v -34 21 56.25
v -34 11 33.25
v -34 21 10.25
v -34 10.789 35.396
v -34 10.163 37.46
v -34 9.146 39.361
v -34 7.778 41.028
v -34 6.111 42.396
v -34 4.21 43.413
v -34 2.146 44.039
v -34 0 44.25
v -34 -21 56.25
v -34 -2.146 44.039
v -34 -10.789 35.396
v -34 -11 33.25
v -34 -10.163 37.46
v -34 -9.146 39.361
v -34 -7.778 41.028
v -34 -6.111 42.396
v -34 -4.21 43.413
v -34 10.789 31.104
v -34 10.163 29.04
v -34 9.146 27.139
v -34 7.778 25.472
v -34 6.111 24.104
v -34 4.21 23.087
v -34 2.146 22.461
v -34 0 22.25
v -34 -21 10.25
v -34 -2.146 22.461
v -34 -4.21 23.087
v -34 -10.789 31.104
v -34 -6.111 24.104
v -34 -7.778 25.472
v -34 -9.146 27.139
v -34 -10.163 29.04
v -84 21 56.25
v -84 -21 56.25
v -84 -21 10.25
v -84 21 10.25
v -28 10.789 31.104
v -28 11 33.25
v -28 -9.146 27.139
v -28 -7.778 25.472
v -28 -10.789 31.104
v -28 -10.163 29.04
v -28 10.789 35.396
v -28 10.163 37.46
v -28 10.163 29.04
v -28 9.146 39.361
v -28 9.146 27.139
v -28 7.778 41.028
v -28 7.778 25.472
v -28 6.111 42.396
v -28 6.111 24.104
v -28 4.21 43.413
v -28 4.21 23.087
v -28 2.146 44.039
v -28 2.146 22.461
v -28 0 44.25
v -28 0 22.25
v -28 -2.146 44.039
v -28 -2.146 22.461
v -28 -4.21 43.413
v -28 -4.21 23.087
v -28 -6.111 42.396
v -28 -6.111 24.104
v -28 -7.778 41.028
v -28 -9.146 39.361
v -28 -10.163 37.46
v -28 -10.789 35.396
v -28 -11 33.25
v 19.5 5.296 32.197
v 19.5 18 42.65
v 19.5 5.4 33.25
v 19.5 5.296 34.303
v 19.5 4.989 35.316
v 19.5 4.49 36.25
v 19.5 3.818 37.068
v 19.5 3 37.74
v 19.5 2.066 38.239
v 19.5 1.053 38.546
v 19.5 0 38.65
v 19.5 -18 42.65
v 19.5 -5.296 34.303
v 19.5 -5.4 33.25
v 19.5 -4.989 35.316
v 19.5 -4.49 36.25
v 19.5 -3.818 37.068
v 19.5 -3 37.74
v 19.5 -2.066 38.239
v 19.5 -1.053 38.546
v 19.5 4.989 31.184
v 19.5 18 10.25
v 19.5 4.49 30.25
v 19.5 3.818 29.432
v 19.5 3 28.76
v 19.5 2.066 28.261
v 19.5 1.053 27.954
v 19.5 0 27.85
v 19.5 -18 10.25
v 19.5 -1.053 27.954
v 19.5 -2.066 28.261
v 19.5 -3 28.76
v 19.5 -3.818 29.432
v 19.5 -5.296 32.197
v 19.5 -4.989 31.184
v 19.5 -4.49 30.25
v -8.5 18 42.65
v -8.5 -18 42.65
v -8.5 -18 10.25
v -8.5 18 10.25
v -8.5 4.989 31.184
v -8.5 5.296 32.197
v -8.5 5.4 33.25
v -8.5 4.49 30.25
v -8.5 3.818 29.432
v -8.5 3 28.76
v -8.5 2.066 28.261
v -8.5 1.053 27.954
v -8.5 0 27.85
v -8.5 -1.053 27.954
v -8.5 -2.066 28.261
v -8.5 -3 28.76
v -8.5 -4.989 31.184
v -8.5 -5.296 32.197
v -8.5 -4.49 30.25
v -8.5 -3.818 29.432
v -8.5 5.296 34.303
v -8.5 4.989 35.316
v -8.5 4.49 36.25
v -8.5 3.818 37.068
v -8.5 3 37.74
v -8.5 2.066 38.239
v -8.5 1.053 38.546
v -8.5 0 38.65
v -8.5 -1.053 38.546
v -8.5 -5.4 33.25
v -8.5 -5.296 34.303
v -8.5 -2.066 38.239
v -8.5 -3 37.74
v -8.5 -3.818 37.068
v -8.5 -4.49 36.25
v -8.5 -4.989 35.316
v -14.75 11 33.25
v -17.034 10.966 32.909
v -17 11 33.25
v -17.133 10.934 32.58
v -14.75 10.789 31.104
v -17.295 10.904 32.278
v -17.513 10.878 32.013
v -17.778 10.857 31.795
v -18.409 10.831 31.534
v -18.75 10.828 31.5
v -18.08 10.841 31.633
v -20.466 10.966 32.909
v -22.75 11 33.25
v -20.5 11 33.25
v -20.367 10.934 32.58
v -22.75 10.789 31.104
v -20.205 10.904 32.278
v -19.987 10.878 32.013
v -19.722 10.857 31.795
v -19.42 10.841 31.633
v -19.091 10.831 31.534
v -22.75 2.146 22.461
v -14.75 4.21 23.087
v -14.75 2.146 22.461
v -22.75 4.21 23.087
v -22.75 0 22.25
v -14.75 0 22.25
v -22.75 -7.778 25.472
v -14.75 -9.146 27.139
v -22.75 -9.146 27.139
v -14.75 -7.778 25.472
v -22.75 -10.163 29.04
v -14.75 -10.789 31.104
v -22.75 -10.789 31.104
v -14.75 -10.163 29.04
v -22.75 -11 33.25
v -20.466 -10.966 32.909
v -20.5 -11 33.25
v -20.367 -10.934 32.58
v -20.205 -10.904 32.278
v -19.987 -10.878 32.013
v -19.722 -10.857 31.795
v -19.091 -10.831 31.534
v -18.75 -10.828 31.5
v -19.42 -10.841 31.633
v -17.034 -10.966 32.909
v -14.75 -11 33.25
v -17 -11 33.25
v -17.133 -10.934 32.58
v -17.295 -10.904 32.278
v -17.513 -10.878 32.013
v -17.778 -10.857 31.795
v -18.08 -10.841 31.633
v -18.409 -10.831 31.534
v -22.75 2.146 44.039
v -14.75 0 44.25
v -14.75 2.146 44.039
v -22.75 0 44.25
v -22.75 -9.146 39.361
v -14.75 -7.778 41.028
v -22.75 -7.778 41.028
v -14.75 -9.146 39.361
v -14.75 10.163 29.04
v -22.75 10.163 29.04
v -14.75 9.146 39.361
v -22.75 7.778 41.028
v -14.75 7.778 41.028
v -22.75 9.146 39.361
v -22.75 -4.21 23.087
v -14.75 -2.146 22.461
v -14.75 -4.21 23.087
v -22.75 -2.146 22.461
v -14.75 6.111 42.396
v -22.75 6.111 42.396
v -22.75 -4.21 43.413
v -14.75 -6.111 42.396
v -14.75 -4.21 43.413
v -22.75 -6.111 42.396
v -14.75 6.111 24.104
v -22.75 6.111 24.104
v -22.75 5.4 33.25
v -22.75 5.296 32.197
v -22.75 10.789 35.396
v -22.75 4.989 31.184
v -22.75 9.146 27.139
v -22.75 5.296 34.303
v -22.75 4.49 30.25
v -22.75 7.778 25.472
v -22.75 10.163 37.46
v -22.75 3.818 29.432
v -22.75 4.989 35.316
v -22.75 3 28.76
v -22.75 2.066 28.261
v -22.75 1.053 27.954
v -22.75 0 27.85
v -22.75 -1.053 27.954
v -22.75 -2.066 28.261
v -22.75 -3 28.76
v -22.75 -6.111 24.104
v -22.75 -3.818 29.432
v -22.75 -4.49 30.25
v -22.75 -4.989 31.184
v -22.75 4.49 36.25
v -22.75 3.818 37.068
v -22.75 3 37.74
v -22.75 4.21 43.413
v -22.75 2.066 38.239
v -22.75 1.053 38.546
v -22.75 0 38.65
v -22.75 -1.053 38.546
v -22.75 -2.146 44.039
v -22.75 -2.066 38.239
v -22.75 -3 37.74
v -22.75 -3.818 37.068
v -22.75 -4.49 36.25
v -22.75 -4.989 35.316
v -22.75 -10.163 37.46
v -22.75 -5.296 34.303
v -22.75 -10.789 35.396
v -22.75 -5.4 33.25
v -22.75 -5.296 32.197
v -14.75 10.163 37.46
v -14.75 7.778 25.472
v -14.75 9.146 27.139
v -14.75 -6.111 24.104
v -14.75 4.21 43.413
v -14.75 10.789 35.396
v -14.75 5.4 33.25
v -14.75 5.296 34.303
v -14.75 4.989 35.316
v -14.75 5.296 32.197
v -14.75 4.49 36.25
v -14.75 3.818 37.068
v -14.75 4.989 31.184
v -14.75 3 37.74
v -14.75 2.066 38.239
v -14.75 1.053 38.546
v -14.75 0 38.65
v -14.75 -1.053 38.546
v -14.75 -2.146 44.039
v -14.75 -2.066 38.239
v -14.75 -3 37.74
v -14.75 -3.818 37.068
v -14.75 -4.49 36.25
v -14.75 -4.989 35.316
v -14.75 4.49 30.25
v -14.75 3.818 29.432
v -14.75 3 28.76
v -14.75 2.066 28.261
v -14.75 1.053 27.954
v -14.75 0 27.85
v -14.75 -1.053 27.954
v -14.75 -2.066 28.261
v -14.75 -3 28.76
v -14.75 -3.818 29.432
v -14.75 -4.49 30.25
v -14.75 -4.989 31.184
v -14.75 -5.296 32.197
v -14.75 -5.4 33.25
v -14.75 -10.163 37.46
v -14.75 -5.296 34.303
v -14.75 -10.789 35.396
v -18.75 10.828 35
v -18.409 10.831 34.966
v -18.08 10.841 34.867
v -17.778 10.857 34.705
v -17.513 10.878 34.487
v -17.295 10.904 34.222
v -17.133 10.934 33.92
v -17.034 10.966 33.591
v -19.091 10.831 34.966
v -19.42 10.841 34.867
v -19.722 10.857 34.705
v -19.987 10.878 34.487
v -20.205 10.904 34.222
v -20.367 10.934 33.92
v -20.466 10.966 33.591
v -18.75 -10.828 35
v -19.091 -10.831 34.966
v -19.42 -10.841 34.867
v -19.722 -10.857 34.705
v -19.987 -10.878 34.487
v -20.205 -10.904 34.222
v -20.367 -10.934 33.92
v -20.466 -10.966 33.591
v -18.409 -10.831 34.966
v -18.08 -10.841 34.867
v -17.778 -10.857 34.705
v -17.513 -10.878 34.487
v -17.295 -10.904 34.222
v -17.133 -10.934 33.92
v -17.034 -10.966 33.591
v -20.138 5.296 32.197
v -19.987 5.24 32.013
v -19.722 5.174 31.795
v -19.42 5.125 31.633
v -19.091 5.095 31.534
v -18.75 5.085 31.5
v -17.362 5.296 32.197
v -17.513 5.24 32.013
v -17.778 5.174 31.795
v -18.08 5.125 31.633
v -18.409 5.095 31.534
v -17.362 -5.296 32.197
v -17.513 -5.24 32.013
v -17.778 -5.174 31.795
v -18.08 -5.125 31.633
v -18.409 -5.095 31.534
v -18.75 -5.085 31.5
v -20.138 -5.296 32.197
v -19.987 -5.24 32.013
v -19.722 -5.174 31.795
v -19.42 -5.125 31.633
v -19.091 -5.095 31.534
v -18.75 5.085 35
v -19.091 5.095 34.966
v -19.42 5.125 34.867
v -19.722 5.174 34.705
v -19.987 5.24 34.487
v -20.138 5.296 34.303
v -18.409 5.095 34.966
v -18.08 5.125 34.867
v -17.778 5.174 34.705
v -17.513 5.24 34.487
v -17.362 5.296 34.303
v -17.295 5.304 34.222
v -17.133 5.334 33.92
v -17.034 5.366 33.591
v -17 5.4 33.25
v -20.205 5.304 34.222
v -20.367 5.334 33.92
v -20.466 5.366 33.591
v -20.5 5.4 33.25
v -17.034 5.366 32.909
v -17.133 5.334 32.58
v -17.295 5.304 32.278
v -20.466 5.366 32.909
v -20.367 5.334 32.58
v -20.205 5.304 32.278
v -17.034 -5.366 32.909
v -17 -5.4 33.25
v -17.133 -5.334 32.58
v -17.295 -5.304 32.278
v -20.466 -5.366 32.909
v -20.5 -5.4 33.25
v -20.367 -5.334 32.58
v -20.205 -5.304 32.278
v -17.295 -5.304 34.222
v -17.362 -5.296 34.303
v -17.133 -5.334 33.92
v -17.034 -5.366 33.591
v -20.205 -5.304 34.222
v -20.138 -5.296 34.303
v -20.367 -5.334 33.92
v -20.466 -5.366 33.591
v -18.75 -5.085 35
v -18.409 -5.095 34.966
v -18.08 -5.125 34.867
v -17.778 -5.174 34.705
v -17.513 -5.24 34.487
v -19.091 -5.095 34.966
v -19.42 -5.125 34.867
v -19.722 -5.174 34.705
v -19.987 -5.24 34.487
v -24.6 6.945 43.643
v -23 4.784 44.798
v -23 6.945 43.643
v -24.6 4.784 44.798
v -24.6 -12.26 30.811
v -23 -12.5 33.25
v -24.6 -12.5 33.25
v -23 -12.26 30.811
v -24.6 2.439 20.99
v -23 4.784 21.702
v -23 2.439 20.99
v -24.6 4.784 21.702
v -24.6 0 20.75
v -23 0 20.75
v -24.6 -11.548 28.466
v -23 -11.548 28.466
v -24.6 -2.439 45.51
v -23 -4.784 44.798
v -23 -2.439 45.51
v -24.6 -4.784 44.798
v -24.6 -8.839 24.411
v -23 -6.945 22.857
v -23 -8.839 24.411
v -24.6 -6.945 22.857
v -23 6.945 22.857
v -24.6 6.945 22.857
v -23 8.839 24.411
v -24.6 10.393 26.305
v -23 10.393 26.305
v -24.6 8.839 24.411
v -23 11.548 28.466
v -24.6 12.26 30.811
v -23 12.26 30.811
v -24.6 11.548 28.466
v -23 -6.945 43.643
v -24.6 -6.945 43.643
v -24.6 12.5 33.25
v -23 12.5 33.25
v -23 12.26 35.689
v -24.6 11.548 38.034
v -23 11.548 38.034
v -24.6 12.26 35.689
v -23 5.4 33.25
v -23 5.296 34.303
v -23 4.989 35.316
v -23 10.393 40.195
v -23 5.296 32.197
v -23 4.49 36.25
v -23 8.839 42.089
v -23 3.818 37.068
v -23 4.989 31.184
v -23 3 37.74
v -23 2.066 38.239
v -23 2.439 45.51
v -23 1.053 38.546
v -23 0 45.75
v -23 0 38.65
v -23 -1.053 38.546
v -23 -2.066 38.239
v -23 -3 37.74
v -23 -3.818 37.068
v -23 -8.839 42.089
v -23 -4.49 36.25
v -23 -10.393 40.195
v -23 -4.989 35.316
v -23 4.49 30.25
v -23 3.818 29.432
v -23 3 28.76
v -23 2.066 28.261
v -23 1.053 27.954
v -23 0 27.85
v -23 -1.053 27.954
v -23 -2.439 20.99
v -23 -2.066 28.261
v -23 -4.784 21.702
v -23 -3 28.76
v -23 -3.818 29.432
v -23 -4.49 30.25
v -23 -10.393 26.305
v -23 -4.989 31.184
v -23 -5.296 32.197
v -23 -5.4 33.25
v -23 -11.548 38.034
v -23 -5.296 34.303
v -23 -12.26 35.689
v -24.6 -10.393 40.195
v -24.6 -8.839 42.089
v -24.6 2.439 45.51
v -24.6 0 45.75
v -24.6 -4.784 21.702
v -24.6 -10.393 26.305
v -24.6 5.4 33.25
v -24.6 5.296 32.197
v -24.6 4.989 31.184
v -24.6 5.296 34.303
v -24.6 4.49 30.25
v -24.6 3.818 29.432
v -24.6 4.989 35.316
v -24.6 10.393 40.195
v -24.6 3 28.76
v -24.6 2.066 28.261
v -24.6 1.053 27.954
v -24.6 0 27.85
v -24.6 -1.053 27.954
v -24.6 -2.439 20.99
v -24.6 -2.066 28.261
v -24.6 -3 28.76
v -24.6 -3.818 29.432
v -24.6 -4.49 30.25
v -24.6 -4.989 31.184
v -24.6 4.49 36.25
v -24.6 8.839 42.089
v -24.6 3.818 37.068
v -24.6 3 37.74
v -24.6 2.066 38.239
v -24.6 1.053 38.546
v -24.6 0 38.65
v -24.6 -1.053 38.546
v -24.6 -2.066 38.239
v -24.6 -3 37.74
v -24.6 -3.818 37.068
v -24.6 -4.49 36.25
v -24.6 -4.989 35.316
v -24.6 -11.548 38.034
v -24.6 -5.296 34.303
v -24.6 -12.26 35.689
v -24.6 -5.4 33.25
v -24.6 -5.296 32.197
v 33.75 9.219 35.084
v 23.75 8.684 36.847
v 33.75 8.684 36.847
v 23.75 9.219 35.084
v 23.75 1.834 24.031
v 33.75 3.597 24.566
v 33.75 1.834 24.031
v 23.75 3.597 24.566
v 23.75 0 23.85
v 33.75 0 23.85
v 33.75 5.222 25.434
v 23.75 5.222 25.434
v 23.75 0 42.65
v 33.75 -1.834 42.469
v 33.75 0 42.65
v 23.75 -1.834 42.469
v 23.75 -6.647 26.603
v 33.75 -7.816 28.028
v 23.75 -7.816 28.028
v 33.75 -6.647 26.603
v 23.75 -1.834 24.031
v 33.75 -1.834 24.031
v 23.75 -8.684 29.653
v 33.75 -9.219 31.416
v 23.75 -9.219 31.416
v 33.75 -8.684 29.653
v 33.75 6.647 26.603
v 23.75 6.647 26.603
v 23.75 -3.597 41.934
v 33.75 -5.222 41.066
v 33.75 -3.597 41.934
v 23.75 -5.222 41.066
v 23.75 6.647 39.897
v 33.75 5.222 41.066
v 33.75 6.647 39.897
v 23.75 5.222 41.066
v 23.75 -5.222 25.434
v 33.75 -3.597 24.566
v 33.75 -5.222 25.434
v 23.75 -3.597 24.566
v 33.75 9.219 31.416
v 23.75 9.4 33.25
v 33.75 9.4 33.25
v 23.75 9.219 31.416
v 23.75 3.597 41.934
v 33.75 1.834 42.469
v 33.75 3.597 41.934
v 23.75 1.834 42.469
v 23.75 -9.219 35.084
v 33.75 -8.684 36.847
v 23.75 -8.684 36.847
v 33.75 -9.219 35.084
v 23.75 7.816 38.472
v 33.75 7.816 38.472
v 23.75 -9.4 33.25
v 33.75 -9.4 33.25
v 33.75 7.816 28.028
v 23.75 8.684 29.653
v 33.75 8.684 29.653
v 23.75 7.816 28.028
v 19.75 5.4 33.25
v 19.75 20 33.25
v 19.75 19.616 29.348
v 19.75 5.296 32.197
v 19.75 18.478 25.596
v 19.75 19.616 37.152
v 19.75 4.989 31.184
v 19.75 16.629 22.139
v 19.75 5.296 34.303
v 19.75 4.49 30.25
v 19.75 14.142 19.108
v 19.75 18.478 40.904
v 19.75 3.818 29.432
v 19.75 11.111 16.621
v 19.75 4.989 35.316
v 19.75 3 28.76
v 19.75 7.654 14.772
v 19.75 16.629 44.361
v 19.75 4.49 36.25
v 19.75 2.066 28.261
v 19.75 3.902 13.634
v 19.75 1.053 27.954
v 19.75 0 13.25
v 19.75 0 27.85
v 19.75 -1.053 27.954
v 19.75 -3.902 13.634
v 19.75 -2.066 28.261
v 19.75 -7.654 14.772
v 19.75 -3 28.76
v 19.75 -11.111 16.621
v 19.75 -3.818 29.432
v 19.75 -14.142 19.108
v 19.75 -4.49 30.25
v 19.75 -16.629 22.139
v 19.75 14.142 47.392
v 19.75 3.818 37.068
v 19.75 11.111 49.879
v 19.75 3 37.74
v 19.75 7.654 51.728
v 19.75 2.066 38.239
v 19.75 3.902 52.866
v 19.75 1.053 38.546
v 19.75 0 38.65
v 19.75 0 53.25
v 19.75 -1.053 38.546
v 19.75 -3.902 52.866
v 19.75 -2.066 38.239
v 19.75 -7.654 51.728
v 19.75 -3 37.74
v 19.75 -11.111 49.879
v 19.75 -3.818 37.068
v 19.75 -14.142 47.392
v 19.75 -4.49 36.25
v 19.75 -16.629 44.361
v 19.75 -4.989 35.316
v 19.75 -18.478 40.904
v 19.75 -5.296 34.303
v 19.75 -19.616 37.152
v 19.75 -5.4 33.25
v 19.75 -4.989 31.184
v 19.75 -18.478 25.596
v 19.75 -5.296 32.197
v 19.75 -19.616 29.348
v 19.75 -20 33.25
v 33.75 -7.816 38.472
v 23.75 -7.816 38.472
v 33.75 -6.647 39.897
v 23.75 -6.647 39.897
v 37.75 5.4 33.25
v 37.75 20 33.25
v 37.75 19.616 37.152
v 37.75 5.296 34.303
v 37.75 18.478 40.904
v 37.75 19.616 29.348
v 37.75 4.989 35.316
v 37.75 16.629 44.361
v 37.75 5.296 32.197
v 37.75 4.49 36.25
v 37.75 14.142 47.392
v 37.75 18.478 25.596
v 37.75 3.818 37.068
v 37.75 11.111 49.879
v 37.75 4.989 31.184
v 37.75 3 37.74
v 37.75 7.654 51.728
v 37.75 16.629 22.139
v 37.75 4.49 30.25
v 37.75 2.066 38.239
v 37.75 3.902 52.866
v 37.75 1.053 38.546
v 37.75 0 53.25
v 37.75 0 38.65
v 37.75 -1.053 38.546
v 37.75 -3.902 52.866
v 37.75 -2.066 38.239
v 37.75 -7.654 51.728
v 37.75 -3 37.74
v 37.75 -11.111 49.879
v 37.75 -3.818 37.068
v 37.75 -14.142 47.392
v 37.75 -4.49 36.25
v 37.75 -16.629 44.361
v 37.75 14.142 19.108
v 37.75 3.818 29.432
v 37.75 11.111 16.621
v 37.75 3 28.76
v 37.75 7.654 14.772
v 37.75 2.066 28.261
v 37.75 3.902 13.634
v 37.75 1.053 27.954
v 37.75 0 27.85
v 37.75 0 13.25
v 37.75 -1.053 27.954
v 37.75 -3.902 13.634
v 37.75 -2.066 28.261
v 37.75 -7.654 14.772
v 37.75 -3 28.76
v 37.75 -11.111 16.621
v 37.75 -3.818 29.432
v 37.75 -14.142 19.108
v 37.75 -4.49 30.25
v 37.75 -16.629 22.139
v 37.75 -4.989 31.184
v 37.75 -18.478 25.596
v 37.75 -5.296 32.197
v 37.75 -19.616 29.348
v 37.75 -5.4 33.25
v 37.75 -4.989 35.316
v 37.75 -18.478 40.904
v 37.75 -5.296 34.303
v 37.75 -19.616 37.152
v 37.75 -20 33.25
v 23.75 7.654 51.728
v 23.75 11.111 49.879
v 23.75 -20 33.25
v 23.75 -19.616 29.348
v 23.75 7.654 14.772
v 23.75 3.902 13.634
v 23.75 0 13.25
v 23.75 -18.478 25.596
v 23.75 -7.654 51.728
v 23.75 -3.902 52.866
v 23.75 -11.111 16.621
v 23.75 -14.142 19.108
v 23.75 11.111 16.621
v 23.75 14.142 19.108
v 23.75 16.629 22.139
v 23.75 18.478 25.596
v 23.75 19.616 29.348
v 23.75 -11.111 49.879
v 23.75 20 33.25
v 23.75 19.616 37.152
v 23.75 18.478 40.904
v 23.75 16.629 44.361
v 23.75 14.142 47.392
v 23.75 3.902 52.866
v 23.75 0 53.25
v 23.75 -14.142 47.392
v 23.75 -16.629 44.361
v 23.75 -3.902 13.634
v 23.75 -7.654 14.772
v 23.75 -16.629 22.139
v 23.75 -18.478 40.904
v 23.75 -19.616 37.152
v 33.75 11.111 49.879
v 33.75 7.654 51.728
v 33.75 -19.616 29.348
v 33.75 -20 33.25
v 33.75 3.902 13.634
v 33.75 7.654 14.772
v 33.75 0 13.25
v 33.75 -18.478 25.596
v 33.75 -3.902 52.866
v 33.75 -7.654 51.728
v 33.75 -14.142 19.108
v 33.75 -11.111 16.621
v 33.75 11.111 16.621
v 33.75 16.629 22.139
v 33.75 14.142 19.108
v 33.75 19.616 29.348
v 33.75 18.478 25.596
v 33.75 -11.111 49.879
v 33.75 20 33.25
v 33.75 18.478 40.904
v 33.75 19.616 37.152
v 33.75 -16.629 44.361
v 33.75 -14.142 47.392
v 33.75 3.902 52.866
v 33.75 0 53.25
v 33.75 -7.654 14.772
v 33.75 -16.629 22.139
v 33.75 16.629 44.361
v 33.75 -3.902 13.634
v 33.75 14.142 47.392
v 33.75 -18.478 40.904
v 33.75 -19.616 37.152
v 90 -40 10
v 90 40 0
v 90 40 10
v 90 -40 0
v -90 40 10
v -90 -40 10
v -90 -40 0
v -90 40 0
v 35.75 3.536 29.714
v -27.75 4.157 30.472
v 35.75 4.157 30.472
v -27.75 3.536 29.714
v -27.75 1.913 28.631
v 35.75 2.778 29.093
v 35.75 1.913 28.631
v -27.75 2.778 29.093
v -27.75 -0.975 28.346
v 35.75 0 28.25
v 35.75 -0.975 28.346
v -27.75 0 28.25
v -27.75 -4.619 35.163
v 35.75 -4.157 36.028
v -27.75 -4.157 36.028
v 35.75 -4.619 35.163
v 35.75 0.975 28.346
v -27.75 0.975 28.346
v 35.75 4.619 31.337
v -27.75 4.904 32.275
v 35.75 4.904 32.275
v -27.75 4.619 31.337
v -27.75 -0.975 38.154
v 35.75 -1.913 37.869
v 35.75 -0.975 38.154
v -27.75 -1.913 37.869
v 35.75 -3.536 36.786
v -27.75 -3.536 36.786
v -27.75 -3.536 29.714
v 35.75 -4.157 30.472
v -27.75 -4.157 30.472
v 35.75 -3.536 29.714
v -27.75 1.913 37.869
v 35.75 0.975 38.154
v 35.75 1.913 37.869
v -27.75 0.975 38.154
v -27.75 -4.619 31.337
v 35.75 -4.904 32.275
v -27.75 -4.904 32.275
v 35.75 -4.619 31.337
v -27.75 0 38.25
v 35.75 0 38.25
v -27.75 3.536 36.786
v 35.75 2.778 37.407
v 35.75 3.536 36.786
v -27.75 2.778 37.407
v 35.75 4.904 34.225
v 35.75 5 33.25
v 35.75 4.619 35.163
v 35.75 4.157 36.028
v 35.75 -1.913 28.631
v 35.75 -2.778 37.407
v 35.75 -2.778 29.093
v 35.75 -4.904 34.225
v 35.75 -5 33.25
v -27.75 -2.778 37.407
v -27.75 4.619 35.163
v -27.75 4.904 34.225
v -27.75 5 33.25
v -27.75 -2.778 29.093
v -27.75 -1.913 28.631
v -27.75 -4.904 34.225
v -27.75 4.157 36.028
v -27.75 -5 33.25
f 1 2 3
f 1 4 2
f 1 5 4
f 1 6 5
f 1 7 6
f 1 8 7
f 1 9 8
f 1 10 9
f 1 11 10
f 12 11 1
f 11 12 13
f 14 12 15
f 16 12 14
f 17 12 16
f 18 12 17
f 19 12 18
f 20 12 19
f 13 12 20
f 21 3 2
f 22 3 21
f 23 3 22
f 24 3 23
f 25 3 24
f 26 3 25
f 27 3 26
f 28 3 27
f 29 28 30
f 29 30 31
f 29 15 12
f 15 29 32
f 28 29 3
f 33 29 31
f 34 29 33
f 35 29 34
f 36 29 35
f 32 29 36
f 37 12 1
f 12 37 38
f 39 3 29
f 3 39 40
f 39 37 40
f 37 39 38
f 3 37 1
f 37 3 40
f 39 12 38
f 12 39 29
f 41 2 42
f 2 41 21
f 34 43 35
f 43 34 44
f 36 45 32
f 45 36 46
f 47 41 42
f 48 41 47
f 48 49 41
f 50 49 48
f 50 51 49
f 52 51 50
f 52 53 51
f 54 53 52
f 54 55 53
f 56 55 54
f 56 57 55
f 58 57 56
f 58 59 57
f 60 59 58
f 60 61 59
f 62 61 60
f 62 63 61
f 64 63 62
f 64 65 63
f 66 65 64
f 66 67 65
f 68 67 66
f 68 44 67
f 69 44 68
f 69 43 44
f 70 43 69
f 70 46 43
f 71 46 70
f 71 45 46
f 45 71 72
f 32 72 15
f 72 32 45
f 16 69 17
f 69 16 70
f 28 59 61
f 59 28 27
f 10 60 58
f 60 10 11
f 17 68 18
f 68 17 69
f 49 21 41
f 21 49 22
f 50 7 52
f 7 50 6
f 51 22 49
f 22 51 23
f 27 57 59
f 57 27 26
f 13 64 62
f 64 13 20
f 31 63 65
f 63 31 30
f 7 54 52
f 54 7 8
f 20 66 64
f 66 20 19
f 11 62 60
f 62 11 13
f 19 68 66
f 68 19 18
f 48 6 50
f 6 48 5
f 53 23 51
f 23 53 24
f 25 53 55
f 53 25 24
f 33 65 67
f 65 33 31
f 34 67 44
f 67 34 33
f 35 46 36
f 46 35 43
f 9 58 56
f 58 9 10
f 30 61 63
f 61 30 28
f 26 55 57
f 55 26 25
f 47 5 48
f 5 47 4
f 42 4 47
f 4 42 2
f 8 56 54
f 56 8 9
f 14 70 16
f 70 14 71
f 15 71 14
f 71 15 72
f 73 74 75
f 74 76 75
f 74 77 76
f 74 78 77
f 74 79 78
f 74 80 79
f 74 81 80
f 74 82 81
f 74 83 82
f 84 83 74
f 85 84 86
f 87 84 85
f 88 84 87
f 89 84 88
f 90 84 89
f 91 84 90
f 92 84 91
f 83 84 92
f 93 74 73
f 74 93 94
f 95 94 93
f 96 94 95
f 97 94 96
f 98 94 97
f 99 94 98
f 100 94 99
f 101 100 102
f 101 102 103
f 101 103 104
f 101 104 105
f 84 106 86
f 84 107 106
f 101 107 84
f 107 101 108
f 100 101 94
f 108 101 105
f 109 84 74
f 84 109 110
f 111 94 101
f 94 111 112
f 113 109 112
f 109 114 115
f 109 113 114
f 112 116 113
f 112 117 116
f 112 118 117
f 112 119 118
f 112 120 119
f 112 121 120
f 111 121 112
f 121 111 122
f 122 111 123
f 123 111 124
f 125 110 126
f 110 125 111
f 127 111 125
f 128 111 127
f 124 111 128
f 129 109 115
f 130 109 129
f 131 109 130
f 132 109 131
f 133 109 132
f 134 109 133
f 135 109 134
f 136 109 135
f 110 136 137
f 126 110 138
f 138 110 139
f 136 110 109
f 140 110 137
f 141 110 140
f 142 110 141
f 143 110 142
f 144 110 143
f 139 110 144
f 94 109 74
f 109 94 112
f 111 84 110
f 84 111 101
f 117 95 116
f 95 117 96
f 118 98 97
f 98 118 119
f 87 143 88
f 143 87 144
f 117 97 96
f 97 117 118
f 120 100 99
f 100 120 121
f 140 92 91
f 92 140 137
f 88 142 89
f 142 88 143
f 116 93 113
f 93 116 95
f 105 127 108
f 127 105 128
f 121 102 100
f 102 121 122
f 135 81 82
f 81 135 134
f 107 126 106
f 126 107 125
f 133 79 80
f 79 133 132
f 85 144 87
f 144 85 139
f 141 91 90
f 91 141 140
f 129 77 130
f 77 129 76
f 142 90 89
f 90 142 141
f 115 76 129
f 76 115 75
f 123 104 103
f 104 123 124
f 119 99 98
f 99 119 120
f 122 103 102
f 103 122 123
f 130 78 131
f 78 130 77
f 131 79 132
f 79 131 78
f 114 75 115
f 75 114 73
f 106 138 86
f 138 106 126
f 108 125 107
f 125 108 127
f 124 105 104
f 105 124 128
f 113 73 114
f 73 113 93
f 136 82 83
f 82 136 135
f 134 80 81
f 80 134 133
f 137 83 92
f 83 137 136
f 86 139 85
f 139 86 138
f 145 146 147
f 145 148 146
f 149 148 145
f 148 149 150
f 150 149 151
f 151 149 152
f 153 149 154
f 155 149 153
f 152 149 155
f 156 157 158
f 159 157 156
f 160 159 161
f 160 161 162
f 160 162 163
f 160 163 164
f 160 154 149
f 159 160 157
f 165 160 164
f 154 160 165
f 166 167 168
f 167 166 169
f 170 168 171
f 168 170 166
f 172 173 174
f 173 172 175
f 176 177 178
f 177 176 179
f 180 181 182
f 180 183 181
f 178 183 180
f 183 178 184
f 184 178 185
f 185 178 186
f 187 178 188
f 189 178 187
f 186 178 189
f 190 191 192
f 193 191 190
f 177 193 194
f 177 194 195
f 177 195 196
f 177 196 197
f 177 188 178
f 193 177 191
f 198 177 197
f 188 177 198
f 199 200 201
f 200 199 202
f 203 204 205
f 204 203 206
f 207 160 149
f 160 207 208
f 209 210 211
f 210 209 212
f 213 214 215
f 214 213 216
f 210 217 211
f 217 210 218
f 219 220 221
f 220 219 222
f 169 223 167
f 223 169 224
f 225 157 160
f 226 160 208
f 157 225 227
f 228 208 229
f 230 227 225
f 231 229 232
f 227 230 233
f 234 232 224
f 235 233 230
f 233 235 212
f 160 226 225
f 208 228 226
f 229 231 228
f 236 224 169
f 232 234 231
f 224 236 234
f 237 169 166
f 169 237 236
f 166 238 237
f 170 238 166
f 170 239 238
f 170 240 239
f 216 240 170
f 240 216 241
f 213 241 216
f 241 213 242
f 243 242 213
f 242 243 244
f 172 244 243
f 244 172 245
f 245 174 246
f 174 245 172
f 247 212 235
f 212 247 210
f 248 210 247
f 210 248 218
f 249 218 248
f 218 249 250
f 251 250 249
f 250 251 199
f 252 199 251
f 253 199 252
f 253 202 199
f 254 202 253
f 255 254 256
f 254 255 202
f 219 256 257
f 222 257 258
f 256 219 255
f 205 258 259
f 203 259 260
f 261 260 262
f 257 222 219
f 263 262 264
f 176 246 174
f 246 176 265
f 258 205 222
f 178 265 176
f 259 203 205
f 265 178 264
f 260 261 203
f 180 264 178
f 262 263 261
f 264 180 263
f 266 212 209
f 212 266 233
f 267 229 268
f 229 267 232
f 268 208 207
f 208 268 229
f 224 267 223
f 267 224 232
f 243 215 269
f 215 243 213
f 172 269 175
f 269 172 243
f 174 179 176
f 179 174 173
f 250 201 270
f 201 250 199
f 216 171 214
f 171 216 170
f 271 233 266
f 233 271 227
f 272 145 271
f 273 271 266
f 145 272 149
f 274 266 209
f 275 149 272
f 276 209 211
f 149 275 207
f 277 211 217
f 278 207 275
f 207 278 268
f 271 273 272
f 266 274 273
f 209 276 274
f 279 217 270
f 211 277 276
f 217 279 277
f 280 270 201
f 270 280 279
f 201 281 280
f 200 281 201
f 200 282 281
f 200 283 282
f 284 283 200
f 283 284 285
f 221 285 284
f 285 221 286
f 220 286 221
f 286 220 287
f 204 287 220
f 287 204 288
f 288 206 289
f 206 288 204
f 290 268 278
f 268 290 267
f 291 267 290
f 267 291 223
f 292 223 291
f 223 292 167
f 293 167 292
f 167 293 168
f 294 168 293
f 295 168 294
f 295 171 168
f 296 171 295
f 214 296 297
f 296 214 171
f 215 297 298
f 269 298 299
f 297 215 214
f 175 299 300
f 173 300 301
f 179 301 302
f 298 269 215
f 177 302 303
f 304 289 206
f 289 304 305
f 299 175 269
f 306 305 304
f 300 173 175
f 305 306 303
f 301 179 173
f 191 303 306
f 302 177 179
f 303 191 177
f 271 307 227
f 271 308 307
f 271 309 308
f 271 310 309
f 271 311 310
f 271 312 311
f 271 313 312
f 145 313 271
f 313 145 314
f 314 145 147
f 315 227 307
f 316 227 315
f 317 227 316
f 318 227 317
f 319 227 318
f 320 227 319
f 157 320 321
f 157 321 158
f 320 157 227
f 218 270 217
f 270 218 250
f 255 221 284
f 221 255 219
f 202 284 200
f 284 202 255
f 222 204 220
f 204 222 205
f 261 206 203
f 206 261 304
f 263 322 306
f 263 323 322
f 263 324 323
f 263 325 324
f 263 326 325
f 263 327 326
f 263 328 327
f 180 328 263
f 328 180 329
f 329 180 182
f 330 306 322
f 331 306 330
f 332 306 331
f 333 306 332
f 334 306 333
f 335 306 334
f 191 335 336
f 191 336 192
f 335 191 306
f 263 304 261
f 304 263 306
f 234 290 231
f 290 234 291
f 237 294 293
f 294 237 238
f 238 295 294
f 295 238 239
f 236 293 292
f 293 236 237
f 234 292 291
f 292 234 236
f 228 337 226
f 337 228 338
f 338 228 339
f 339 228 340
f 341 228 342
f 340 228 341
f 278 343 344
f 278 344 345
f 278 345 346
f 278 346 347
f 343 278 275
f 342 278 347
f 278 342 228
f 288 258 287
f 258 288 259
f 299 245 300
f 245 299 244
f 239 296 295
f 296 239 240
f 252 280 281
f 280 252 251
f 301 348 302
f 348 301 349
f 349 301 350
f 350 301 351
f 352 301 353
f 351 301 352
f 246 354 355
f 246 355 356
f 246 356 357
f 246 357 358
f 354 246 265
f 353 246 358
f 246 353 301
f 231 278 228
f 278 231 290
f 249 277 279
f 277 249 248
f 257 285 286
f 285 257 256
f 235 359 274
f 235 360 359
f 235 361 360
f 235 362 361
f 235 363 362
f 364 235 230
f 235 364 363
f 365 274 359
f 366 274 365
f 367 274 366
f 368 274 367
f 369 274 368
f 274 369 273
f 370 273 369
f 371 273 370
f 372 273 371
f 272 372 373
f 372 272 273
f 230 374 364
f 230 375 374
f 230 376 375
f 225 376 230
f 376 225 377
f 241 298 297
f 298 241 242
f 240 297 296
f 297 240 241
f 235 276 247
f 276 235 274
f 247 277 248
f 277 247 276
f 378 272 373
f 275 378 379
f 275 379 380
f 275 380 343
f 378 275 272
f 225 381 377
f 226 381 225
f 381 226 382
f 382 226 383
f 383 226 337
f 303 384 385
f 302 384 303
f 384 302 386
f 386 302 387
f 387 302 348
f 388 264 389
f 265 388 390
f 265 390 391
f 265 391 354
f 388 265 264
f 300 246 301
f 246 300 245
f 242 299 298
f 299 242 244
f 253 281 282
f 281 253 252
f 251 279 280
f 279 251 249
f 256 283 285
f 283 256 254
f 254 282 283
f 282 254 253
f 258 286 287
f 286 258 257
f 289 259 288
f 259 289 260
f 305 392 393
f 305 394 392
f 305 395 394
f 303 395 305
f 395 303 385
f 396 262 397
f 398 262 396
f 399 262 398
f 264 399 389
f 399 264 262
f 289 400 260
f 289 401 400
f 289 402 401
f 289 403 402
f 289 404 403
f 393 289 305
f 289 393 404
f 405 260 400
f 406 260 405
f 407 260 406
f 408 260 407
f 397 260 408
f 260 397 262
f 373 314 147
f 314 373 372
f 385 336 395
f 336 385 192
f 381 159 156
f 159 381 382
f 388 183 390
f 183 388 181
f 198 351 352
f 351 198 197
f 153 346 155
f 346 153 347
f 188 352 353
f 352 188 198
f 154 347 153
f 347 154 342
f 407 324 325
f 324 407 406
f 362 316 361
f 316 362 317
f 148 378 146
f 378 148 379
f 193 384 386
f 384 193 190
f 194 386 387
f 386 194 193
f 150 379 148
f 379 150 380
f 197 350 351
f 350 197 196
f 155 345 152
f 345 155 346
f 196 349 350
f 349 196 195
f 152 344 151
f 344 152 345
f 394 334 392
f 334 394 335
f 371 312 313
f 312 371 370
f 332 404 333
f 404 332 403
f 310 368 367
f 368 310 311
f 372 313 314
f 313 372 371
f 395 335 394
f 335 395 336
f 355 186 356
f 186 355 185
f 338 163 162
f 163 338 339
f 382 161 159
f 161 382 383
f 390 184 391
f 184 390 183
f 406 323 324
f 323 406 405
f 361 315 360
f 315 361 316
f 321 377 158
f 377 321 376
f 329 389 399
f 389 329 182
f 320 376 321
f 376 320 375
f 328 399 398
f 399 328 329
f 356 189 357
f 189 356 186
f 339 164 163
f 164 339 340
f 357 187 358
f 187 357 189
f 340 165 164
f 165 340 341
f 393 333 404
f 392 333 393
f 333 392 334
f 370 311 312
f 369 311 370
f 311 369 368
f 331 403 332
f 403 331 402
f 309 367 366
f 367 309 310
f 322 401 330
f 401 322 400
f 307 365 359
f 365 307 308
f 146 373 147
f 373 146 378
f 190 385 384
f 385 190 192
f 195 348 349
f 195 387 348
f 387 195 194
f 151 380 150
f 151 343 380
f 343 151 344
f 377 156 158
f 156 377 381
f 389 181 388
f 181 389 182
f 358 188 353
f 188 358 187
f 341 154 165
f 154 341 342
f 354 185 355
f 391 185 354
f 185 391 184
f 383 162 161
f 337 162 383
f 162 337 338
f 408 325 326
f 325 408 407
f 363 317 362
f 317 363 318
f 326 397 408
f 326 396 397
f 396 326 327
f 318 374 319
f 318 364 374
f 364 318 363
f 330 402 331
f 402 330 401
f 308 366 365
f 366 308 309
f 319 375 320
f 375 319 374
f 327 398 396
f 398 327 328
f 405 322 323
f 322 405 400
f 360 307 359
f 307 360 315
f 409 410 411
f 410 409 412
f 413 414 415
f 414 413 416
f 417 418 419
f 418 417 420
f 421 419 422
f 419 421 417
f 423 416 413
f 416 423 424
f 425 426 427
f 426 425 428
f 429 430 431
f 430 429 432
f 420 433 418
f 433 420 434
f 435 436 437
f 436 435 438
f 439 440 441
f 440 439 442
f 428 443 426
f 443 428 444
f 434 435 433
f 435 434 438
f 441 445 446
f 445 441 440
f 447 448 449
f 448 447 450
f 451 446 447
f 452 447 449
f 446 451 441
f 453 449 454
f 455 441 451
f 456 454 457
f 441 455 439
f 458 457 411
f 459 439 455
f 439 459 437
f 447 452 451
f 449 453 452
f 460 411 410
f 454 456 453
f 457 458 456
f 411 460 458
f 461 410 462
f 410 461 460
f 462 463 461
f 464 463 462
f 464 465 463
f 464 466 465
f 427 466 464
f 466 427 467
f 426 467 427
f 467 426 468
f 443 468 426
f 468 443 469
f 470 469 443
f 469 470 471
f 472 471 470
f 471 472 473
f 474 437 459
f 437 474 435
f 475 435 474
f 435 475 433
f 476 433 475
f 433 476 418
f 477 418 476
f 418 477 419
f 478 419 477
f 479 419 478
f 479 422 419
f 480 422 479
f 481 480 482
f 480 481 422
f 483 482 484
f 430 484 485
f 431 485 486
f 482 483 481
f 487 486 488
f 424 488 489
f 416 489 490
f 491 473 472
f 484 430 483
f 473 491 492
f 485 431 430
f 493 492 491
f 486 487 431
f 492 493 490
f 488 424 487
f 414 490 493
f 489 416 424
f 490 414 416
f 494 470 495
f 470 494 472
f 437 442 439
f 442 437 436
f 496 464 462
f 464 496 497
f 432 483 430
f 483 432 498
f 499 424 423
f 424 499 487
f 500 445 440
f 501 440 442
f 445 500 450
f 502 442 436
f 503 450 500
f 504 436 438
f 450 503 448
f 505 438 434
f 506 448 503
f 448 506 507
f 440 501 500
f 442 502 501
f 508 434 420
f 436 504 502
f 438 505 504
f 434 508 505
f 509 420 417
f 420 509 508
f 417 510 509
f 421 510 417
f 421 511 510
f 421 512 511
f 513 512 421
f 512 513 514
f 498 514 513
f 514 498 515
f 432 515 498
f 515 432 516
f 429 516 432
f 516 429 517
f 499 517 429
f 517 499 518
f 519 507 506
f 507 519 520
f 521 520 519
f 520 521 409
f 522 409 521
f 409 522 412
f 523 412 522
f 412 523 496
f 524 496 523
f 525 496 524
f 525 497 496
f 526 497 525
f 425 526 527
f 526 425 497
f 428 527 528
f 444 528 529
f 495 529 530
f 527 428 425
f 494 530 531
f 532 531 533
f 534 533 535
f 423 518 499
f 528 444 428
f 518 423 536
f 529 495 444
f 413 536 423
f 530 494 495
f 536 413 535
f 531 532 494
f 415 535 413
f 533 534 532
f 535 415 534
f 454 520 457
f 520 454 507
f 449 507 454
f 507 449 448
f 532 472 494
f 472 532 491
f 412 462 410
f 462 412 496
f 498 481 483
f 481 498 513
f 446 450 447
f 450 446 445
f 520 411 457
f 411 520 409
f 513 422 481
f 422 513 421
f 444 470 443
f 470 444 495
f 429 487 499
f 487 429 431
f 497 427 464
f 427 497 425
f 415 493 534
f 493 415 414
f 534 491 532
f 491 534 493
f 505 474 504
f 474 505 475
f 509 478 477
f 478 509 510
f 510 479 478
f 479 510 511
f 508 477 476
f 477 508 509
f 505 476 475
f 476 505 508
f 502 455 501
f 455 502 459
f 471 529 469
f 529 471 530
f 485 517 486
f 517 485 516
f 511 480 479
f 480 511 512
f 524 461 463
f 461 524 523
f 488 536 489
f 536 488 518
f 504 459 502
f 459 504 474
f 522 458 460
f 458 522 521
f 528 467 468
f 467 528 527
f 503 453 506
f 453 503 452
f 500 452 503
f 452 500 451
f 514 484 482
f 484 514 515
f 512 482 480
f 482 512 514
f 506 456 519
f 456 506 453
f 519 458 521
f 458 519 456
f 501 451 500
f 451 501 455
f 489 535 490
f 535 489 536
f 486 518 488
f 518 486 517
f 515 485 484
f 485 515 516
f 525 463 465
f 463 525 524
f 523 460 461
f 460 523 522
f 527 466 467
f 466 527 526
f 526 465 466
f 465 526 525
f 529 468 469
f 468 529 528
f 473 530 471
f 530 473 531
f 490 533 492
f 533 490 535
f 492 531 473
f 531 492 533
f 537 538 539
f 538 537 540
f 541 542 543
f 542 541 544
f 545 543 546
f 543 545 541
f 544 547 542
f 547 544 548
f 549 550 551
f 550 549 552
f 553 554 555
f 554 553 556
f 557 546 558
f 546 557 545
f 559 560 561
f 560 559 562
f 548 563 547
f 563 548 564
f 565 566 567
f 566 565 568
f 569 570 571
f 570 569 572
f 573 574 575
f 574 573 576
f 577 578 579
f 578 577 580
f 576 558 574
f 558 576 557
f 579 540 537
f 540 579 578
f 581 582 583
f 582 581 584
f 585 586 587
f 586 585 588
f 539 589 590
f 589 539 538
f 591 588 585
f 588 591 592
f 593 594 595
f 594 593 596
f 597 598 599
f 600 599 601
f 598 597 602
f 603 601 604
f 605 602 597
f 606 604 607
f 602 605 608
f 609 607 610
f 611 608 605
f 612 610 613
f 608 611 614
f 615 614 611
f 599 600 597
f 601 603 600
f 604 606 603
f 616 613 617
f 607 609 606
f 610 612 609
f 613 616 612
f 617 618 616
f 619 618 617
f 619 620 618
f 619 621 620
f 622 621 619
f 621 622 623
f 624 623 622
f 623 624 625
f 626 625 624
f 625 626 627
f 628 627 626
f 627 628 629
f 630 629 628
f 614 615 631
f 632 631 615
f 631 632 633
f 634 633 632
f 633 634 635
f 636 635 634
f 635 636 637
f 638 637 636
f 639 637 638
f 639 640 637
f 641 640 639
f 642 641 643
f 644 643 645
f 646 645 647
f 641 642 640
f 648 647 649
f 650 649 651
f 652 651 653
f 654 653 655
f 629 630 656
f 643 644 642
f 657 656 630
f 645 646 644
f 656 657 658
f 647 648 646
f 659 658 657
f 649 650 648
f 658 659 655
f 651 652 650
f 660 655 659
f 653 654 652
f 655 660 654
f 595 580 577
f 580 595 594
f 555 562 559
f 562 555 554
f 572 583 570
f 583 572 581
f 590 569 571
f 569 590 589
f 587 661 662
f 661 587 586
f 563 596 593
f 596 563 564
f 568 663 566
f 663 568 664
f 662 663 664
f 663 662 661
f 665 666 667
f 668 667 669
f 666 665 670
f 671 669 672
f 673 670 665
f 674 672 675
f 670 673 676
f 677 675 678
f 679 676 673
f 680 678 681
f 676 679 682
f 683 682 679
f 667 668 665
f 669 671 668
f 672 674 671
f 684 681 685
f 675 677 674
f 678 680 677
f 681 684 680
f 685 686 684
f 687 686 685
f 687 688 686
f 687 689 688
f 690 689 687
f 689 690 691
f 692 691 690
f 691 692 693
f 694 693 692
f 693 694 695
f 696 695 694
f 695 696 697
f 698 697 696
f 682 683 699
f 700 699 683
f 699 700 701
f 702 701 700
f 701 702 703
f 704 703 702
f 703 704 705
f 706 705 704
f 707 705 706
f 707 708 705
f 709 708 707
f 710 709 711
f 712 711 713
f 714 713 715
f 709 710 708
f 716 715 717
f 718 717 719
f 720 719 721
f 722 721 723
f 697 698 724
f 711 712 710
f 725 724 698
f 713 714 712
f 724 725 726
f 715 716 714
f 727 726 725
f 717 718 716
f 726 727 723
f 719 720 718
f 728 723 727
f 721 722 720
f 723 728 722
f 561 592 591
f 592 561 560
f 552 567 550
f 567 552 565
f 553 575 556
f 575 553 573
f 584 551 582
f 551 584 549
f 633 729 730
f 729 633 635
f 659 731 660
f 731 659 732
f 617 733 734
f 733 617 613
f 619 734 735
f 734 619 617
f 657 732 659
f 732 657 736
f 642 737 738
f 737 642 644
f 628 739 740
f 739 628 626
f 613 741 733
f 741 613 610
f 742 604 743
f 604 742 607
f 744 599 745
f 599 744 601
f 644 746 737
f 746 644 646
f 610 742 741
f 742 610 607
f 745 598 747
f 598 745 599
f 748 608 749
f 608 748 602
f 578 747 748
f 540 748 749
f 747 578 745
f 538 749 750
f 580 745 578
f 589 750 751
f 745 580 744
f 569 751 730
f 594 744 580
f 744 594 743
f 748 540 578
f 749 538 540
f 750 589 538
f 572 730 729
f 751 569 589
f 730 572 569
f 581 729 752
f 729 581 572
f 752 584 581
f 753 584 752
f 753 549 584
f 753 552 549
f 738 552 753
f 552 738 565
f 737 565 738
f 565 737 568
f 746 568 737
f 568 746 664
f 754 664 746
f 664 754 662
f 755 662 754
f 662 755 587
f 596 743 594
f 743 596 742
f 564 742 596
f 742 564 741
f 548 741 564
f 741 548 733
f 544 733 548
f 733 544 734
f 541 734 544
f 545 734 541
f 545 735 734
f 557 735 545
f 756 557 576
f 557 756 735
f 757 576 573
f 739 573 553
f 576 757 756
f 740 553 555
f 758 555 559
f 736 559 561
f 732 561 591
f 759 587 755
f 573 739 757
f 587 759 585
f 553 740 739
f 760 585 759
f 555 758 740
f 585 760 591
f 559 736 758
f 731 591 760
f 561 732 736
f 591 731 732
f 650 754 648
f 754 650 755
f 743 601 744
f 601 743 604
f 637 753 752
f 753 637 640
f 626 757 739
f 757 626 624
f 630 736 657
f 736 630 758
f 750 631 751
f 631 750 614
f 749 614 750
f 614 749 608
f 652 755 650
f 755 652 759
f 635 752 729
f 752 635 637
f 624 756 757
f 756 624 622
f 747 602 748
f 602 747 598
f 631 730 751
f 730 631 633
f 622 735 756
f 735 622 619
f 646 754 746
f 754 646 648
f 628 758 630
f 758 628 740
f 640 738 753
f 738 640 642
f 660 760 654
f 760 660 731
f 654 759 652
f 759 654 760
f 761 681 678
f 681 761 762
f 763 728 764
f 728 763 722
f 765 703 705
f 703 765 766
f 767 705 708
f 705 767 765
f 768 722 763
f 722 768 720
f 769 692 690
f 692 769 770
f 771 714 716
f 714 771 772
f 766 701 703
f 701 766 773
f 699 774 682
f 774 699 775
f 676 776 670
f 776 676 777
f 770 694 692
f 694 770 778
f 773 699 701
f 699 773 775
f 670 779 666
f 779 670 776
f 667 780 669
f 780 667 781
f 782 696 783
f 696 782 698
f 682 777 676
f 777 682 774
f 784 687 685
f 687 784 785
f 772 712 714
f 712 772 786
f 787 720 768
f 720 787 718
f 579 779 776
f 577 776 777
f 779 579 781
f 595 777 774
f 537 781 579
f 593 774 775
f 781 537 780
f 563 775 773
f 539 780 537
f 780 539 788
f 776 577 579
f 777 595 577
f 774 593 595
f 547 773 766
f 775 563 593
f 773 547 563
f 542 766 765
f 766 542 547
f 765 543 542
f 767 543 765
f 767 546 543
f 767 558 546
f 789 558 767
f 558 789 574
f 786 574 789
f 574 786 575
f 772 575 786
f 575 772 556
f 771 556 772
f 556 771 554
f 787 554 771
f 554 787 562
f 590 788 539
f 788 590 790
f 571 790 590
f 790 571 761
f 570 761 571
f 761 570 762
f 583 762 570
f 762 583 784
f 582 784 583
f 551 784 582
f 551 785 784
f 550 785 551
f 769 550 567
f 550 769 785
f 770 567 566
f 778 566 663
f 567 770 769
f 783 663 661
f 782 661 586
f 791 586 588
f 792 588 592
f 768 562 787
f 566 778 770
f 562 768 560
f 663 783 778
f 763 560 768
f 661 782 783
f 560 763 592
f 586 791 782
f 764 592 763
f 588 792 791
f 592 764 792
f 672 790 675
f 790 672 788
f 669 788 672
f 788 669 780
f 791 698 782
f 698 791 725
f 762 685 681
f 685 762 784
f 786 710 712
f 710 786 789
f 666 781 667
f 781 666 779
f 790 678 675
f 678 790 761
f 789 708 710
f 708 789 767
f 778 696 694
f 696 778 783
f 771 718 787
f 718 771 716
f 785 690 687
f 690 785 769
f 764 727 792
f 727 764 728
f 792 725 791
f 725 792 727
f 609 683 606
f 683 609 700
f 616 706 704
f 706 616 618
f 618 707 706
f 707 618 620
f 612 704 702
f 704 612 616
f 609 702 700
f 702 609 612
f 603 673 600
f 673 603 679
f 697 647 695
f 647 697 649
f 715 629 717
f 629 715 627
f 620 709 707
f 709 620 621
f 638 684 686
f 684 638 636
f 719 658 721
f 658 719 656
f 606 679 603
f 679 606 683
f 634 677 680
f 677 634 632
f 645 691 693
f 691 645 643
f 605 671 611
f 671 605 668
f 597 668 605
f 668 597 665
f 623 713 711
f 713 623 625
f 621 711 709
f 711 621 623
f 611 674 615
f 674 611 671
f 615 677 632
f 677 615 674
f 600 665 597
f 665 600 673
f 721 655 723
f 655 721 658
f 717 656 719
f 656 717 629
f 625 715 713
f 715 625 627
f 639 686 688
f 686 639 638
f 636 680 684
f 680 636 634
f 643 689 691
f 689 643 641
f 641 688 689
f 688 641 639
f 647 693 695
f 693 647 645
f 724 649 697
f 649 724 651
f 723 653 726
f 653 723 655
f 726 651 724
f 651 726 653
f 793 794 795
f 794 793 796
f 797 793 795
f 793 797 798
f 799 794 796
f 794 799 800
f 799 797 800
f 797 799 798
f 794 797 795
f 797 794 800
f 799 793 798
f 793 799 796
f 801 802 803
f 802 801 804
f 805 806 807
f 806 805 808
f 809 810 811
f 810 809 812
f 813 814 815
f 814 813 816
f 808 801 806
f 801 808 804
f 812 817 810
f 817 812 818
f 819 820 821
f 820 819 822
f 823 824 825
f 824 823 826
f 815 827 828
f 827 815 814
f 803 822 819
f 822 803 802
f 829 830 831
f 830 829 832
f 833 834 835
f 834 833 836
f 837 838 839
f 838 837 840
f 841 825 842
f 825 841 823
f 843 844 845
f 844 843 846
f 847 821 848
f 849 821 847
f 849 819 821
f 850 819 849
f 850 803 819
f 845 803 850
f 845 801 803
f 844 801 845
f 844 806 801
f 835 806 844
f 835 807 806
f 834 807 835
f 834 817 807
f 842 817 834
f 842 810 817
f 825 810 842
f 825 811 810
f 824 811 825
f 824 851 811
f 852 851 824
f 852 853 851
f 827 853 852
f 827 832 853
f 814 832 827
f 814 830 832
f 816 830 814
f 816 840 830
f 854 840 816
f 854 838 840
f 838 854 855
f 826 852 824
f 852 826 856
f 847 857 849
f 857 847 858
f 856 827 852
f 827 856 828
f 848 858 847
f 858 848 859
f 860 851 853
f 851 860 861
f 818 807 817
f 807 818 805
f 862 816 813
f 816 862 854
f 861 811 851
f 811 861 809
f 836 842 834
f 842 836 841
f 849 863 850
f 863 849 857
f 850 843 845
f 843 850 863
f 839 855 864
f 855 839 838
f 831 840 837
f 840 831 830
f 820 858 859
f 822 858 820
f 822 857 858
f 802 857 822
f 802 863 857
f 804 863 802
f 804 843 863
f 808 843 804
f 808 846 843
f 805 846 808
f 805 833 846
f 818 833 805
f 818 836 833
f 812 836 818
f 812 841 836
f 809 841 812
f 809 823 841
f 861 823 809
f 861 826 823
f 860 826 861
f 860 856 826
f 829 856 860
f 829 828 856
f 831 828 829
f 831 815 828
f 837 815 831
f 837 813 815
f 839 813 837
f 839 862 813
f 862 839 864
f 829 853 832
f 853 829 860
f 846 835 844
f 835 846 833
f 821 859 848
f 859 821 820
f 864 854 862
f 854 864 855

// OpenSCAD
$fn = 32;

// ------------------------------------------------------------------------
// Motor drive station: motor 50 x 46 mm, shaft d10, pulley d40
// Every part is its own module, assembly() places every instance.
// ------------------------------------------------------------------------

// --- part 1 ---
module station_bed() {
  difference() {
    translate([-90, -40, 0]) cube([180, 80, 10]);
  }
}

// --- part 2 ---
module drive_motor() {
  union() {
    translate([-25, -21, 0]) cube([50, 42, 46]);
    translate([28, 0, 23]) rotate([0, 90, 0]) cylinder(h = 6, d = 22, center = true);
  }
}

// --- part 3 ---
module pillow_block() {
  difference() {
    translate([-14, -18, 0]) cube([28, 36, 32.4]);
    translate([0, 0, 23]) rotate([0, 90, 0]) cylinder(h = 30, d = 10.8, center = true);
  }
}

// --- part 4 ---
module drive_shaft() {
  translate([0, 0, -31.75]) cylinder(h = 63.5, d = 10);
}

// --- part 5 ---
module shaft_collar() {
  difference() {
    cylinder(h = 8, d = 22);
    translate([0, 0, -1]) cylinder(h = 10, d = 10.8);
    translate([0, 0, 4]) rotate([90, 0, 0]) cylinder(h = 24, d = 3.5, center = true);
  }
}

// --- part 6 ---
module collar_washer() {
  difference() {
      translate([0, 0, 0]) cylinder(h = 1.6, d = 25);
      translate([0, 0, -1]) cylinder(h = 3.6, d = 10.8);
    }
}

// --- part 7 ---
module drive_pulley() {
  difference() {
    union() {
      cylinder(h = 18, d = 18.8);
      cylinder(h = 4, d = 40);
      translate([0, 0, 14]) cylinder(h = 4, d = 40);
    }
    translate([0, 0, -1]) cylinder(h = 20, d = 10.8);
  }
}

// --- assembly ---
module assembly() {
  color([0.80, 0.24, 0.20]) translate([0, 0, 0]) rotate([0, 0, 0]) station_bed();
  color([0.20, 0.45, 0.75]) translate([-59, 0, 10.25]) rotate([0, 0, 0]) drive_motor();
  color([0.25, 0.62, 0.32]) translate([5.5, 0, 10.25]) rotate([0, 0, 0]) pillow_block();
  color([0.92, 0.70, 0.18]) translate([4, 0, 33.25]) rotate([0, 90, 0]) drive_shaft();
  color([0.58, 0.35, 0.70]) translate([-22.75, 0, 33.25]) rotate([0, 90, 0]) shaft_collar();
  color([0.16, 0.66, 0.66]) translate([-24.6, 0, 33.25]) rotate([0, 90, 0]) collar_washer();
  color([0.85, 0.48, 0.18]) translate([19.75, 0, 33.25]) rotate([0, 90, 0]) drive_pulley();
}

assembly();
